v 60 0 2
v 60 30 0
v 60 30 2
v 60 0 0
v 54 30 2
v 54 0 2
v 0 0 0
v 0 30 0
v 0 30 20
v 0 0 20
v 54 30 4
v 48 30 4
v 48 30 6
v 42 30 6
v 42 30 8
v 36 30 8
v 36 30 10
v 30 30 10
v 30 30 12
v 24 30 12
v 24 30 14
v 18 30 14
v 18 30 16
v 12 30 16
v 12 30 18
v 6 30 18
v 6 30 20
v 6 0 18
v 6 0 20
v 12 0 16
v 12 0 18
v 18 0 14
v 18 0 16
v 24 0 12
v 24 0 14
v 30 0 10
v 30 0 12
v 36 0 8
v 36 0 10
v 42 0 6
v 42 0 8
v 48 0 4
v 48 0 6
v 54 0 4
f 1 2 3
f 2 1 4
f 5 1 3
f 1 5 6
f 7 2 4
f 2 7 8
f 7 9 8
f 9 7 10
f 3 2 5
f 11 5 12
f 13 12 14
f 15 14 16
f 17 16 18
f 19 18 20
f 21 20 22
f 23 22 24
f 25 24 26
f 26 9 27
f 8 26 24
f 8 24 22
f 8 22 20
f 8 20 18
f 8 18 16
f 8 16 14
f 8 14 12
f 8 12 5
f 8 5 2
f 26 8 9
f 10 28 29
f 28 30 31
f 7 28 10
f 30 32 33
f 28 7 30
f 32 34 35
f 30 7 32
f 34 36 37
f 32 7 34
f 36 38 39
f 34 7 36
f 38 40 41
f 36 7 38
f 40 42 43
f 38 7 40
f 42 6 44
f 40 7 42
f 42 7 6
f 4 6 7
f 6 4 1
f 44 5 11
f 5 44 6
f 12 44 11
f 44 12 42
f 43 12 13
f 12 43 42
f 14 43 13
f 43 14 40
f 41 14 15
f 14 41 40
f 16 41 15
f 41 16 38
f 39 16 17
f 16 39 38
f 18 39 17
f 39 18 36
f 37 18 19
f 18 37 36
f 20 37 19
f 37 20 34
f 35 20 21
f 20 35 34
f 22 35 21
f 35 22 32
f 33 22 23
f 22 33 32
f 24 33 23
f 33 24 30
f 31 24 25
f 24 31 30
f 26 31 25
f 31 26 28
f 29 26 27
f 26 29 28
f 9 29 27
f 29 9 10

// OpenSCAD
//
//  Toilet_shim
//
//  EvilTeach 11/2015
//
//  A quick and dirty toilet shim, cause i need one now.
//


stepDepth   =  6;   // The depth of one step of the shim
stepHeight  =  2;   // The height of one step of the shim
stepWidth   = 30;   // The width of one step, and hence the width of the shim

shimLength  = 60;   // Total Length of the shim


module draw_one_layer(length)
{
    translate([0, 0, (shimLength - length) / stepDepth * stepHeight])
        cube([length, stepWidth, stepHeight]);
}


module main()
{
    for (length=[shimLength: -stepDepth : stepDepth])
    {
        draw_one_layer(length);
    }
}

main();
